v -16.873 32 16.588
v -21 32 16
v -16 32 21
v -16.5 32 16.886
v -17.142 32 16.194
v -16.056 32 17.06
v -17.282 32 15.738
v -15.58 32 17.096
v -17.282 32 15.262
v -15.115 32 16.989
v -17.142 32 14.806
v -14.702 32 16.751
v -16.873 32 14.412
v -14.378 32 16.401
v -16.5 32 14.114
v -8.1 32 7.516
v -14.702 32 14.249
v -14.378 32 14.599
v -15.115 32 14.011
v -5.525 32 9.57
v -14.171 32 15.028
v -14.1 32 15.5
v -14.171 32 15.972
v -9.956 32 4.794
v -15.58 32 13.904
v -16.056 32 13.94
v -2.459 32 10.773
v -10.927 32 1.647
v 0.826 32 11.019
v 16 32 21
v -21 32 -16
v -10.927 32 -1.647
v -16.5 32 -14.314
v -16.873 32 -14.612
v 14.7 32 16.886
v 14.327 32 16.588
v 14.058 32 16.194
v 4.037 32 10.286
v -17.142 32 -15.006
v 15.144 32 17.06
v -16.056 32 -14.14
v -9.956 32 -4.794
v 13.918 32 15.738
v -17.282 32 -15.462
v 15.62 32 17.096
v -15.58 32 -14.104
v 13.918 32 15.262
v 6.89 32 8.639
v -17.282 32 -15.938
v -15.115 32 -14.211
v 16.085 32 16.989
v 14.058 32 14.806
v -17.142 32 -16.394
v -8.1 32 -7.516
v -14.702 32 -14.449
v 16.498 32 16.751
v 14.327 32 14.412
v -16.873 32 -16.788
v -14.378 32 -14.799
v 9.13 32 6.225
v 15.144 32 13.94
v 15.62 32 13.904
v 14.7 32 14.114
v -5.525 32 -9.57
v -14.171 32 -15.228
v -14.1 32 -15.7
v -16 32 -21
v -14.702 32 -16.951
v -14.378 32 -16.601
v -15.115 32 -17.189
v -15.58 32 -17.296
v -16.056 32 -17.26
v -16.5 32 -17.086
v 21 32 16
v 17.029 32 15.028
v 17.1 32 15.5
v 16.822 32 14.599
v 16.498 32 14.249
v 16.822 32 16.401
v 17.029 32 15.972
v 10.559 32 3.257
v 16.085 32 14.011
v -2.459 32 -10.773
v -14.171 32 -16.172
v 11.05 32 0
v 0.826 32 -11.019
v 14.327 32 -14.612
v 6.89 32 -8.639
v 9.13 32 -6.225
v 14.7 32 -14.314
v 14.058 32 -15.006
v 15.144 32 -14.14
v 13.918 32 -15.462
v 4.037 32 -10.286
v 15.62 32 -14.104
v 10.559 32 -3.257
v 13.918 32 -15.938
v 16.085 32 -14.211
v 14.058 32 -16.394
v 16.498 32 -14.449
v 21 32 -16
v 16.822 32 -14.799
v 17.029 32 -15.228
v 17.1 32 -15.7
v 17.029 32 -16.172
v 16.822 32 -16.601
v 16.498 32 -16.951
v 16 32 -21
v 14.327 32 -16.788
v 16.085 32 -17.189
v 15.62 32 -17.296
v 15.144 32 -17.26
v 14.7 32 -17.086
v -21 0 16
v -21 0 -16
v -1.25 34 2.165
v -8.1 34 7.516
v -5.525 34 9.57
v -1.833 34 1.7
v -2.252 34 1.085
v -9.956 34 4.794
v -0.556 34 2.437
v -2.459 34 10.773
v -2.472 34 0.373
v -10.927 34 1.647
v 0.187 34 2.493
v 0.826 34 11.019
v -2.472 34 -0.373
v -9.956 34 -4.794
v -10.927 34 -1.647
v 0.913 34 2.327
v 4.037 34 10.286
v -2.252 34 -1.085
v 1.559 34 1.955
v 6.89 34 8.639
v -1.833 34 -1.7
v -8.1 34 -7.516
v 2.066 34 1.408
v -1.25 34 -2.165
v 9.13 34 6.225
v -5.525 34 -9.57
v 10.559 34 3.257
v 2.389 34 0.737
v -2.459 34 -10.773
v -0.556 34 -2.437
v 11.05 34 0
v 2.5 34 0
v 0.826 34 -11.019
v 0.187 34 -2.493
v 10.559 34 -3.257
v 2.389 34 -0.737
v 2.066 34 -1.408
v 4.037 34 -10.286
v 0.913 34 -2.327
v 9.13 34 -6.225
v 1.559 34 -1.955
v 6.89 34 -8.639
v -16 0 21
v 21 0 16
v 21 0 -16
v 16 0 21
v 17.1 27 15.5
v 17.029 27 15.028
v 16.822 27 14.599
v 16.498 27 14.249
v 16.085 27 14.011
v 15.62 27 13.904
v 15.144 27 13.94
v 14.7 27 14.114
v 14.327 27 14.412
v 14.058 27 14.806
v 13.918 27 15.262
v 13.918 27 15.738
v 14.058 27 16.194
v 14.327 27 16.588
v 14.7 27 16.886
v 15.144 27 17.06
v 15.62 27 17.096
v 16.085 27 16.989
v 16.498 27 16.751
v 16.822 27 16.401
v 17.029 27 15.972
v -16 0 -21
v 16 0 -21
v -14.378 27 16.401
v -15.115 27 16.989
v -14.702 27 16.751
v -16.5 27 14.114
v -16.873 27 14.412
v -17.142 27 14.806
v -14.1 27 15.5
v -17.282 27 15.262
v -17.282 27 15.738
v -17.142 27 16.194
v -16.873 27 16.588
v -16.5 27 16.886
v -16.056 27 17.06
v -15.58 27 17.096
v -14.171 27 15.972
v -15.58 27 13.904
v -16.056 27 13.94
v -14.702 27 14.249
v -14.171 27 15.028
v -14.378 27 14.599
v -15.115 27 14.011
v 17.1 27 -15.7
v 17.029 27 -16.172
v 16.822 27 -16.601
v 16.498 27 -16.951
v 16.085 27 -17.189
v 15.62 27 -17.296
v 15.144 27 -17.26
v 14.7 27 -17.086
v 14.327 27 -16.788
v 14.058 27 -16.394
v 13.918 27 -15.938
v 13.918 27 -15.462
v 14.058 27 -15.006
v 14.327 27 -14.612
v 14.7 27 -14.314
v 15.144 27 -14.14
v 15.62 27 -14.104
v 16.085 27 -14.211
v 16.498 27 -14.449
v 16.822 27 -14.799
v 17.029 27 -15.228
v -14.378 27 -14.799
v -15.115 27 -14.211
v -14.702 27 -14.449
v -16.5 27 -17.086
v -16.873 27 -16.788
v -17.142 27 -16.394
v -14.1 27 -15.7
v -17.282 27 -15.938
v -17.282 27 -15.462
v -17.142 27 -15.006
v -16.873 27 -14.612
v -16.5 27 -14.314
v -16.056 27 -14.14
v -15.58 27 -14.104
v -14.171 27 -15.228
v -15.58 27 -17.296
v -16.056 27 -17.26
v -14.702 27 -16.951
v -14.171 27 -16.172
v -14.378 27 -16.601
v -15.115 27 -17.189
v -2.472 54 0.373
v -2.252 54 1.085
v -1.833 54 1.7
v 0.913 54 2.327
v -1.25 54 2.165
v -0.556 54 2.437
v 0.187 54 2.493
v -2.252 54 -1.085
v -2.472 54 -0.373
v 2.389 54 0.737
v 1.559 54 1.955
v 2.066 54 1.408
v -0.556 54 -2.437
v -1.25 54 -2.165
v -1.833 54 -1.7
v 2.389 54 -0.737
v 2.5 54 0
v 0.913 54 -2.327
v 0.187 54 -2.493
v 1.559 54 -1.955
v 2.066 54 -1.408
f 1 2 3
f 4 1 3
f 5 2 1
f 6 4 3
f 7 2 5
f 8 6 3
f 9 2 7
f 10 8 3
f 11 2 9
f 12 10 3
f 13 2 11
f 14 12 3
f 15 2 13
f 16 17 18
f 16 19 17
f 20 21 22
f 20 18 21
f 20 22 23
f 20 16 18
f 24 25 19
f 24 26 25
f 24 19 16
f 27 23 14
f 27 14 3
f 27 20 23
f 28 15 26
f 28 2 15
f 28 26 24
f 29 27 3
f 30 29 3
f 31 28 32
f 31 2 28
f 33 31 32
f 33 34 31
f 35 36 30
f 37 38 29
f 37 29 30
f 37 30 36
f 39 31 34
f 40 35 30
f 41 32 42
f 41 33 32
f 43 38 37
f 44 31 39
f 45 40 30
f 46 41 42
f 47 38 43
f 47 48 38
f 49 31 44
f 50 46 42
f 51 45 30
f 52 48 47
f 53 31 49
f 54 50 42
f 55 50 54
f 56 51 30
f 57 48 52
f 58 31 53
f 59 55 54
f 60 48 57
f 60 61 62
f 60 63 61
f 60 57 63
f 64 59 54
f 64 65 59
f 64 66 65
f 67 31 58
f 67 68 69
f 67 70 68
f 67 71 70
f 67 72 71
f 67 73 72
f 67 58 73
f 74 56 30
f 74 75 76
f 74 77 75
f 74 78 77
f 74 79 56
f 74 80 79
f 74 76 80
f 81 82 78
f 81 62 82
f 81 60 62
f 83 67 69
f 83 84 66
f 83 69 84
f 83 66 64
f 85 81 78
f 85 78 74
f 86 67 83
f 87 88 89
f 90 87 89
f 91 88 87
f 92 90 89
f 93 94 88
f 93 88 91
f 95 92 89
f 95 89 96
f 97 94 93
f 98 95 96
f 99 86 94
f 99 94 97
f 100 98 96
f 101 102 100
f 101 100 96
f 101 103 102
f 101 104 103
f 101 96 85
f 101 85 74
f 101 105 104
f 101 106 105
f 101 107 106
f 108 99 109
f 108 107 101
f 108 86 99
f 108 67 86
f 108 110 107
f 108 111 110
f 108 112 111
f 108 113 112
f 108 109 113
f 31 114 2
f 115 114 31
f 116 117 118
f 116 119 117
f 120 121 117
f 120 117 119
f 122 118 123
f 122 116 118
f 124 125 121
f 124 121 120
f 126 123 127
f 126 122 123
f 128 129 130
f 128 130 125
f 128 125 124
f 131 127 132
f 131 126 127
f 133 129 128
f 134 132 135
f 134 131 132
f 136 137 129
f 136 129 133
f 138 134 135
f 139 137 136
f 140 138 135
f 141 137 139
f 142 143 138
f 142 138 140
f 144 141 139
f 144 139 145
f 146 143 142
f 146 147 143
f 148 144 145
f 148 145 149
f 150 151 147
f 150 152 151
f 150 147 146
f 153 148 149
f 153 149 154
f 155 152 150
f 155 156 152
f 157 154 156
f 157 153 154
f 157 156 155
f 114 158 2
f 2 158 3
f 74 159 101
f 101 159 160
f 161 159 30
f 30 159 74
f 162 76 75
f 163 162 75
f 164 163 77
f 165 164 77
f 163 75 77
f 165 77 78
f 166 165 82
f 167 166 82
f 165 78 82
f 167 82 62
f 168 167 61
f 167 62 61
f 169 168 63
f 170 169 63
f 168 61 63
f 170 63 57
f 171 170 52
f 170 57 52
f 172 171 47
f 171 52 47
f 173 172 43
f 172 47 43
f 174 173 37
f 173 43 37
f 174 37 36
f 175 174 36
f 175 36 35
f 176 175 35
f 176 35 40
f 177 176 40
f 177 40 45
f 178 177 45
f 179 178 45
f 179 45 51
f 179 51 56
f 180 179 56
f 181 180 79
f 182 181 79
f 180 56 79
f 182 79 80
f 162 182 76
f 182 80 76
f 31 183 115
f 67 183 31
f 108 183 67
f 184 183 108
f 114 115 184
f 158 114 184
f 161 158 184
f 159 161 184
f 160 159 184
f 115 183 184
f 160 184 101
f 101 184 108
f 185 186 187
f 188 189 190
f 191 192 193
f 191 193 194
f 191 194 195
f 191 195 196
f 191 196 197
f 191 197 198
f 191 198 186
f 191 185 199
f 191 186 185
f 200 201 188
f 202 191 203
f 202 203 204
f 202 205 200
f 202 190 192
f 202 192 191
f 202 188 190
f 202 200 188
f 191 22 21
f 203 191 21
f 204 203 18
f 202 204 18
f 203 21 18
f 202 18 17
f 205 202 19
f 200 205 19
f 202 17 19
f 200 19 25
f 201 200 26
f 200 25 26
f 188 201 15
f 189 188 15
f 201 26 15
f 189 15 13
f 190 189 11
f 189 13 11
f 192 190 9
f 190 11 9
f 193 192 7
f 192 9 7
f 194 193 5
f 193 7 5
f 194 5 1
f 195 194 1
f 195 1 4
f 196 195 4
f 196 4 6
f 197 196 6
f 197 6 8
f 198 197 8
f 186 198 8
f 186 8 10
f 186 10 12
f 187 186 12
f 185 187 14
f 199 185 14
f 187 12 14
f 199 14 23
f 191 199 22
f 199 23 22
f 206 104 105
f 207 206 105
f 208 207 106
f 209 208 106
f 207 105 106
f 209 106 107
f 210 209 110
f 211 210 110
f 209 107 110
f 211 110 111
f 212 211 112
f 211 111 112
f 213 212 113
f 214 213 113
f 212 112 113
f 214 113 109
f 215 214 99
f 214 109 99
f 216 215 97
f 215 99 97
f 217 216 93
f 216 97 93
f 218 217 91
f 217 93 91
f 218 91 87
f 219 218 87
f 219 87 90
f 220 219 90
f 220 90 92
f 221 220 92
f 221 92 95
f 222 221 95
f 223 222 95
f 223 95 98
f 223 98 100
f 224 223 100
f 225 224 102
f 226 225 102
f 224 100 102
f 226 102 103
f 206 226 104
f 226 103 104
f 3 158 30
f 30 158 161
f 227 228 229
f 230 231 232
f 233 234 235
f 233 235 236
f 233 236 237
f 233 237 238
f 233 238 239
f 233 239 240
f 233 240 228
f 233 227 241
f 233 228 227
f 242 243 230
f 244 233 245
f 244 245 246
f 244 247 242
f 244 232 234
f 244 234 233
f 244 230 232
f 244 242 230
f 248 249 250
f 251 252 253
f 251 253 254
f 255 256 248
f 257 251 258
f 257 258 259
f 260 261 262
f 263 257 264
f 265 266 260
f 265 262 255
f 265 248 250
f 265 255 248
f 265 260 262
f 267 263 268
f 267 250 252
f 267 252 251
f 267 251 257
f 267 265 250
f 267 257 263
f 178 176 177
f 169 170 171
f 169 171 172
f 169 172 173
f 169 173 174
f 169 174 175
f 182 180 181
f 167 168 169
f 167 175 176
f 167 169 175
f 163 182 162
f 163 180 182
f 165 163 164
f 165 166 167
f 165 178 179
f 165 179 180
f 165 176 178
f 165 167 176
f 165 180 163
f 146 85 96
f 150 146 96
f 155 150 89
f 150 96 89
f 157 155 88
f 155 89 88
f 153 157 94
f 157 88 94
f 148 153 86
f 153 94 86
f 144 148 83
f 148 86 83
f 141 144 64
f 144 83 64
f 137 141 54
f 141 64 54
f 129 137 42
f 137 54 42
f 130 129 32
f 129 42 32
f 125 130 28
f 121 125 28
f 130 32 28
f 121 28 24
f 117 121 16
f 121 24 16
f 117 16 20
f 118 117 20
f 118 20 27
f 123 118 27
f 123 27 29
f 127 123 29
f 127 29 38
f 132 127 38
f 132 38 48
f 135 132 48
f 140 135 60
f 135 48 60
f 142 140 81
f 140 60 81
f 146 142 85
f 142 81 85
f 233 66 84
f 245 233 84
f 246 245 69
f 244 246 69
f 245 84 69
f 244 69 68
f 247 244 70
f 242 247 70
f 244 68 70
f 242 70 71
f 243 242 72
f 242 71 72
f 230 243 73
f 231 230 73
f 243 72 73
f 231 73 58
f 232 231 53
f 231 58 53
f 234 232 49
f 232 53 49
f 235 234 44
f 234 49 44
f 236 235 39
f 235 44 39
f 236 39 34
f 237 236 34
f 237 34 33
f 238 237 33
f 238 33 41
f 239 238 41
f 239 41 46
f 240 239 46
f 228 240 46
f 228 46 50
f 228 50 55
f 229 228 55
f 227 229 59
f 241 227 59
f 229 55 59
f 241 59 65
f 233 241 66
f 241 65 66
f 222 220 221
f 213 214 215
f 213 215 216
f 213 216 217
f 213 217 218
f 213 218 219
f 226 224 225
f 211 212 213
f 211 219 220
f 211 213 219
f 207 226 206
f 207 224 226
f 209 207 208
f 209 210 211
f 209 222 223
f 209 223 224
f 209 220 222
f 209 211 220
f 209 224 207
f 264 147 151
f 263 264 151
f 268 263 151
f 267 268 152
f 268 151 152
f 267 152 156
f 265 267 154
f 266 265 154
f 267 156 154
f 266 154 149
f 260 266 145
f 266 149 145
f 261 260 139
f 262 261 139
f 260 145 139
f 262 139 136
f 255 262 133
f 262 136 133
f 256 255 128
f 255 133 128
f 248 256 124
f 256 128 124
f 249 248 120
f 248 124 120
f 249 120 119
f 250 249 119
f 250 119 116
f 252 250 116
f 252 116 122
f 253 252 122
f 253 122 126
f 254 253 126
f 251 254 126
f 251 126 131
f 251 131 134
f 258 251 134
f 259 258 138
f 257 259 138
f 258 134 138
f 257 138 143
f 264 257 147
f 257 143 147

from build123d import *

# Parameters (mm, degrees)
SKETCH1_W           = 42
SKETCH1_H           = 42
BOSS_EXTRUDE1_DEPTH = 32
CHAMFER1_SIZE       = 5
SKETCH2_R           = 11.05
BOSS_EXTRUDE2_DEPTH = 2
SKETCH3_R           = 2.5
BOSS_EXTRUDE3_DEPTH = 20
SKETCH4_R           = 1.6
CUT_EXTRUDE1_DEPTH  = 5


with BuildPart() as part:
    # Sketch1 → Boss-Extrude1 (new body)
    with BuildSketch(Plane(origin=(0, 0, 0), x_dir=(1, 0, 0), z_dir=(0, 1, 0))):
        Rectangle(SKETCH1_W, SKETCH1_H)
    extrude(amount=BOSS_EXTRUDE1_DEPTH)

    # Chamfer1
    chamfer1_edges = [part.edges().sort_by_distance(p)[0] for p in [
        (21, 16, 21),
        (-21, 16, 21),
        (-21, 16, -21),
        (21, 16, -21),
    ]]
    chamfer(chamfer1_edges, length=CHAMFER1_SIZE)

    # Sketch2 → Boss-Extrude2 (add)
    with BuildSketch(Plane(origin=(0, 32, 0), x_dir=(1, 0, 0), z_dir=(0, 1, 0))):
        Circle(SKETCH2_R)
    extrude(amount=BOSS_EXTRUDE2_DEPTH)

    # Sketch3 → Boss-Extrude3 (add)
    with BuildSketch(Plane(origin=(0, 34, 0), x_dir=(1, 0, 0), z_dir=(0, 1, 0))):
        Circle(SKETCH3_R)
    extrude(amount=BOSS_EXTRUDE3_DEPTH)

    # Sketch4 → Cut-Extrude1 (cut)
    with BuildSketch(Plane(origin=(0, 32, 0), x_dir=(1, 0, 0), z_dir=(0, 1, 0))):
        with Locations((-15.7, 15.7)):
            Circle(SKETCH4_R)
        with Locations((15.5, 15.7)):
            Circle(SKETCH4_R)
        with Locations((15.5, -15.5)):
            Circle(SKETCH4_R)
        with Locations((-15.7, -15.5)):
            Circle(SKETCH4_R)
    extrude(amount=-CUT_EXTRUDE1_DEPTH, mode=Mode.SUBTRACT)


solid = part.part
